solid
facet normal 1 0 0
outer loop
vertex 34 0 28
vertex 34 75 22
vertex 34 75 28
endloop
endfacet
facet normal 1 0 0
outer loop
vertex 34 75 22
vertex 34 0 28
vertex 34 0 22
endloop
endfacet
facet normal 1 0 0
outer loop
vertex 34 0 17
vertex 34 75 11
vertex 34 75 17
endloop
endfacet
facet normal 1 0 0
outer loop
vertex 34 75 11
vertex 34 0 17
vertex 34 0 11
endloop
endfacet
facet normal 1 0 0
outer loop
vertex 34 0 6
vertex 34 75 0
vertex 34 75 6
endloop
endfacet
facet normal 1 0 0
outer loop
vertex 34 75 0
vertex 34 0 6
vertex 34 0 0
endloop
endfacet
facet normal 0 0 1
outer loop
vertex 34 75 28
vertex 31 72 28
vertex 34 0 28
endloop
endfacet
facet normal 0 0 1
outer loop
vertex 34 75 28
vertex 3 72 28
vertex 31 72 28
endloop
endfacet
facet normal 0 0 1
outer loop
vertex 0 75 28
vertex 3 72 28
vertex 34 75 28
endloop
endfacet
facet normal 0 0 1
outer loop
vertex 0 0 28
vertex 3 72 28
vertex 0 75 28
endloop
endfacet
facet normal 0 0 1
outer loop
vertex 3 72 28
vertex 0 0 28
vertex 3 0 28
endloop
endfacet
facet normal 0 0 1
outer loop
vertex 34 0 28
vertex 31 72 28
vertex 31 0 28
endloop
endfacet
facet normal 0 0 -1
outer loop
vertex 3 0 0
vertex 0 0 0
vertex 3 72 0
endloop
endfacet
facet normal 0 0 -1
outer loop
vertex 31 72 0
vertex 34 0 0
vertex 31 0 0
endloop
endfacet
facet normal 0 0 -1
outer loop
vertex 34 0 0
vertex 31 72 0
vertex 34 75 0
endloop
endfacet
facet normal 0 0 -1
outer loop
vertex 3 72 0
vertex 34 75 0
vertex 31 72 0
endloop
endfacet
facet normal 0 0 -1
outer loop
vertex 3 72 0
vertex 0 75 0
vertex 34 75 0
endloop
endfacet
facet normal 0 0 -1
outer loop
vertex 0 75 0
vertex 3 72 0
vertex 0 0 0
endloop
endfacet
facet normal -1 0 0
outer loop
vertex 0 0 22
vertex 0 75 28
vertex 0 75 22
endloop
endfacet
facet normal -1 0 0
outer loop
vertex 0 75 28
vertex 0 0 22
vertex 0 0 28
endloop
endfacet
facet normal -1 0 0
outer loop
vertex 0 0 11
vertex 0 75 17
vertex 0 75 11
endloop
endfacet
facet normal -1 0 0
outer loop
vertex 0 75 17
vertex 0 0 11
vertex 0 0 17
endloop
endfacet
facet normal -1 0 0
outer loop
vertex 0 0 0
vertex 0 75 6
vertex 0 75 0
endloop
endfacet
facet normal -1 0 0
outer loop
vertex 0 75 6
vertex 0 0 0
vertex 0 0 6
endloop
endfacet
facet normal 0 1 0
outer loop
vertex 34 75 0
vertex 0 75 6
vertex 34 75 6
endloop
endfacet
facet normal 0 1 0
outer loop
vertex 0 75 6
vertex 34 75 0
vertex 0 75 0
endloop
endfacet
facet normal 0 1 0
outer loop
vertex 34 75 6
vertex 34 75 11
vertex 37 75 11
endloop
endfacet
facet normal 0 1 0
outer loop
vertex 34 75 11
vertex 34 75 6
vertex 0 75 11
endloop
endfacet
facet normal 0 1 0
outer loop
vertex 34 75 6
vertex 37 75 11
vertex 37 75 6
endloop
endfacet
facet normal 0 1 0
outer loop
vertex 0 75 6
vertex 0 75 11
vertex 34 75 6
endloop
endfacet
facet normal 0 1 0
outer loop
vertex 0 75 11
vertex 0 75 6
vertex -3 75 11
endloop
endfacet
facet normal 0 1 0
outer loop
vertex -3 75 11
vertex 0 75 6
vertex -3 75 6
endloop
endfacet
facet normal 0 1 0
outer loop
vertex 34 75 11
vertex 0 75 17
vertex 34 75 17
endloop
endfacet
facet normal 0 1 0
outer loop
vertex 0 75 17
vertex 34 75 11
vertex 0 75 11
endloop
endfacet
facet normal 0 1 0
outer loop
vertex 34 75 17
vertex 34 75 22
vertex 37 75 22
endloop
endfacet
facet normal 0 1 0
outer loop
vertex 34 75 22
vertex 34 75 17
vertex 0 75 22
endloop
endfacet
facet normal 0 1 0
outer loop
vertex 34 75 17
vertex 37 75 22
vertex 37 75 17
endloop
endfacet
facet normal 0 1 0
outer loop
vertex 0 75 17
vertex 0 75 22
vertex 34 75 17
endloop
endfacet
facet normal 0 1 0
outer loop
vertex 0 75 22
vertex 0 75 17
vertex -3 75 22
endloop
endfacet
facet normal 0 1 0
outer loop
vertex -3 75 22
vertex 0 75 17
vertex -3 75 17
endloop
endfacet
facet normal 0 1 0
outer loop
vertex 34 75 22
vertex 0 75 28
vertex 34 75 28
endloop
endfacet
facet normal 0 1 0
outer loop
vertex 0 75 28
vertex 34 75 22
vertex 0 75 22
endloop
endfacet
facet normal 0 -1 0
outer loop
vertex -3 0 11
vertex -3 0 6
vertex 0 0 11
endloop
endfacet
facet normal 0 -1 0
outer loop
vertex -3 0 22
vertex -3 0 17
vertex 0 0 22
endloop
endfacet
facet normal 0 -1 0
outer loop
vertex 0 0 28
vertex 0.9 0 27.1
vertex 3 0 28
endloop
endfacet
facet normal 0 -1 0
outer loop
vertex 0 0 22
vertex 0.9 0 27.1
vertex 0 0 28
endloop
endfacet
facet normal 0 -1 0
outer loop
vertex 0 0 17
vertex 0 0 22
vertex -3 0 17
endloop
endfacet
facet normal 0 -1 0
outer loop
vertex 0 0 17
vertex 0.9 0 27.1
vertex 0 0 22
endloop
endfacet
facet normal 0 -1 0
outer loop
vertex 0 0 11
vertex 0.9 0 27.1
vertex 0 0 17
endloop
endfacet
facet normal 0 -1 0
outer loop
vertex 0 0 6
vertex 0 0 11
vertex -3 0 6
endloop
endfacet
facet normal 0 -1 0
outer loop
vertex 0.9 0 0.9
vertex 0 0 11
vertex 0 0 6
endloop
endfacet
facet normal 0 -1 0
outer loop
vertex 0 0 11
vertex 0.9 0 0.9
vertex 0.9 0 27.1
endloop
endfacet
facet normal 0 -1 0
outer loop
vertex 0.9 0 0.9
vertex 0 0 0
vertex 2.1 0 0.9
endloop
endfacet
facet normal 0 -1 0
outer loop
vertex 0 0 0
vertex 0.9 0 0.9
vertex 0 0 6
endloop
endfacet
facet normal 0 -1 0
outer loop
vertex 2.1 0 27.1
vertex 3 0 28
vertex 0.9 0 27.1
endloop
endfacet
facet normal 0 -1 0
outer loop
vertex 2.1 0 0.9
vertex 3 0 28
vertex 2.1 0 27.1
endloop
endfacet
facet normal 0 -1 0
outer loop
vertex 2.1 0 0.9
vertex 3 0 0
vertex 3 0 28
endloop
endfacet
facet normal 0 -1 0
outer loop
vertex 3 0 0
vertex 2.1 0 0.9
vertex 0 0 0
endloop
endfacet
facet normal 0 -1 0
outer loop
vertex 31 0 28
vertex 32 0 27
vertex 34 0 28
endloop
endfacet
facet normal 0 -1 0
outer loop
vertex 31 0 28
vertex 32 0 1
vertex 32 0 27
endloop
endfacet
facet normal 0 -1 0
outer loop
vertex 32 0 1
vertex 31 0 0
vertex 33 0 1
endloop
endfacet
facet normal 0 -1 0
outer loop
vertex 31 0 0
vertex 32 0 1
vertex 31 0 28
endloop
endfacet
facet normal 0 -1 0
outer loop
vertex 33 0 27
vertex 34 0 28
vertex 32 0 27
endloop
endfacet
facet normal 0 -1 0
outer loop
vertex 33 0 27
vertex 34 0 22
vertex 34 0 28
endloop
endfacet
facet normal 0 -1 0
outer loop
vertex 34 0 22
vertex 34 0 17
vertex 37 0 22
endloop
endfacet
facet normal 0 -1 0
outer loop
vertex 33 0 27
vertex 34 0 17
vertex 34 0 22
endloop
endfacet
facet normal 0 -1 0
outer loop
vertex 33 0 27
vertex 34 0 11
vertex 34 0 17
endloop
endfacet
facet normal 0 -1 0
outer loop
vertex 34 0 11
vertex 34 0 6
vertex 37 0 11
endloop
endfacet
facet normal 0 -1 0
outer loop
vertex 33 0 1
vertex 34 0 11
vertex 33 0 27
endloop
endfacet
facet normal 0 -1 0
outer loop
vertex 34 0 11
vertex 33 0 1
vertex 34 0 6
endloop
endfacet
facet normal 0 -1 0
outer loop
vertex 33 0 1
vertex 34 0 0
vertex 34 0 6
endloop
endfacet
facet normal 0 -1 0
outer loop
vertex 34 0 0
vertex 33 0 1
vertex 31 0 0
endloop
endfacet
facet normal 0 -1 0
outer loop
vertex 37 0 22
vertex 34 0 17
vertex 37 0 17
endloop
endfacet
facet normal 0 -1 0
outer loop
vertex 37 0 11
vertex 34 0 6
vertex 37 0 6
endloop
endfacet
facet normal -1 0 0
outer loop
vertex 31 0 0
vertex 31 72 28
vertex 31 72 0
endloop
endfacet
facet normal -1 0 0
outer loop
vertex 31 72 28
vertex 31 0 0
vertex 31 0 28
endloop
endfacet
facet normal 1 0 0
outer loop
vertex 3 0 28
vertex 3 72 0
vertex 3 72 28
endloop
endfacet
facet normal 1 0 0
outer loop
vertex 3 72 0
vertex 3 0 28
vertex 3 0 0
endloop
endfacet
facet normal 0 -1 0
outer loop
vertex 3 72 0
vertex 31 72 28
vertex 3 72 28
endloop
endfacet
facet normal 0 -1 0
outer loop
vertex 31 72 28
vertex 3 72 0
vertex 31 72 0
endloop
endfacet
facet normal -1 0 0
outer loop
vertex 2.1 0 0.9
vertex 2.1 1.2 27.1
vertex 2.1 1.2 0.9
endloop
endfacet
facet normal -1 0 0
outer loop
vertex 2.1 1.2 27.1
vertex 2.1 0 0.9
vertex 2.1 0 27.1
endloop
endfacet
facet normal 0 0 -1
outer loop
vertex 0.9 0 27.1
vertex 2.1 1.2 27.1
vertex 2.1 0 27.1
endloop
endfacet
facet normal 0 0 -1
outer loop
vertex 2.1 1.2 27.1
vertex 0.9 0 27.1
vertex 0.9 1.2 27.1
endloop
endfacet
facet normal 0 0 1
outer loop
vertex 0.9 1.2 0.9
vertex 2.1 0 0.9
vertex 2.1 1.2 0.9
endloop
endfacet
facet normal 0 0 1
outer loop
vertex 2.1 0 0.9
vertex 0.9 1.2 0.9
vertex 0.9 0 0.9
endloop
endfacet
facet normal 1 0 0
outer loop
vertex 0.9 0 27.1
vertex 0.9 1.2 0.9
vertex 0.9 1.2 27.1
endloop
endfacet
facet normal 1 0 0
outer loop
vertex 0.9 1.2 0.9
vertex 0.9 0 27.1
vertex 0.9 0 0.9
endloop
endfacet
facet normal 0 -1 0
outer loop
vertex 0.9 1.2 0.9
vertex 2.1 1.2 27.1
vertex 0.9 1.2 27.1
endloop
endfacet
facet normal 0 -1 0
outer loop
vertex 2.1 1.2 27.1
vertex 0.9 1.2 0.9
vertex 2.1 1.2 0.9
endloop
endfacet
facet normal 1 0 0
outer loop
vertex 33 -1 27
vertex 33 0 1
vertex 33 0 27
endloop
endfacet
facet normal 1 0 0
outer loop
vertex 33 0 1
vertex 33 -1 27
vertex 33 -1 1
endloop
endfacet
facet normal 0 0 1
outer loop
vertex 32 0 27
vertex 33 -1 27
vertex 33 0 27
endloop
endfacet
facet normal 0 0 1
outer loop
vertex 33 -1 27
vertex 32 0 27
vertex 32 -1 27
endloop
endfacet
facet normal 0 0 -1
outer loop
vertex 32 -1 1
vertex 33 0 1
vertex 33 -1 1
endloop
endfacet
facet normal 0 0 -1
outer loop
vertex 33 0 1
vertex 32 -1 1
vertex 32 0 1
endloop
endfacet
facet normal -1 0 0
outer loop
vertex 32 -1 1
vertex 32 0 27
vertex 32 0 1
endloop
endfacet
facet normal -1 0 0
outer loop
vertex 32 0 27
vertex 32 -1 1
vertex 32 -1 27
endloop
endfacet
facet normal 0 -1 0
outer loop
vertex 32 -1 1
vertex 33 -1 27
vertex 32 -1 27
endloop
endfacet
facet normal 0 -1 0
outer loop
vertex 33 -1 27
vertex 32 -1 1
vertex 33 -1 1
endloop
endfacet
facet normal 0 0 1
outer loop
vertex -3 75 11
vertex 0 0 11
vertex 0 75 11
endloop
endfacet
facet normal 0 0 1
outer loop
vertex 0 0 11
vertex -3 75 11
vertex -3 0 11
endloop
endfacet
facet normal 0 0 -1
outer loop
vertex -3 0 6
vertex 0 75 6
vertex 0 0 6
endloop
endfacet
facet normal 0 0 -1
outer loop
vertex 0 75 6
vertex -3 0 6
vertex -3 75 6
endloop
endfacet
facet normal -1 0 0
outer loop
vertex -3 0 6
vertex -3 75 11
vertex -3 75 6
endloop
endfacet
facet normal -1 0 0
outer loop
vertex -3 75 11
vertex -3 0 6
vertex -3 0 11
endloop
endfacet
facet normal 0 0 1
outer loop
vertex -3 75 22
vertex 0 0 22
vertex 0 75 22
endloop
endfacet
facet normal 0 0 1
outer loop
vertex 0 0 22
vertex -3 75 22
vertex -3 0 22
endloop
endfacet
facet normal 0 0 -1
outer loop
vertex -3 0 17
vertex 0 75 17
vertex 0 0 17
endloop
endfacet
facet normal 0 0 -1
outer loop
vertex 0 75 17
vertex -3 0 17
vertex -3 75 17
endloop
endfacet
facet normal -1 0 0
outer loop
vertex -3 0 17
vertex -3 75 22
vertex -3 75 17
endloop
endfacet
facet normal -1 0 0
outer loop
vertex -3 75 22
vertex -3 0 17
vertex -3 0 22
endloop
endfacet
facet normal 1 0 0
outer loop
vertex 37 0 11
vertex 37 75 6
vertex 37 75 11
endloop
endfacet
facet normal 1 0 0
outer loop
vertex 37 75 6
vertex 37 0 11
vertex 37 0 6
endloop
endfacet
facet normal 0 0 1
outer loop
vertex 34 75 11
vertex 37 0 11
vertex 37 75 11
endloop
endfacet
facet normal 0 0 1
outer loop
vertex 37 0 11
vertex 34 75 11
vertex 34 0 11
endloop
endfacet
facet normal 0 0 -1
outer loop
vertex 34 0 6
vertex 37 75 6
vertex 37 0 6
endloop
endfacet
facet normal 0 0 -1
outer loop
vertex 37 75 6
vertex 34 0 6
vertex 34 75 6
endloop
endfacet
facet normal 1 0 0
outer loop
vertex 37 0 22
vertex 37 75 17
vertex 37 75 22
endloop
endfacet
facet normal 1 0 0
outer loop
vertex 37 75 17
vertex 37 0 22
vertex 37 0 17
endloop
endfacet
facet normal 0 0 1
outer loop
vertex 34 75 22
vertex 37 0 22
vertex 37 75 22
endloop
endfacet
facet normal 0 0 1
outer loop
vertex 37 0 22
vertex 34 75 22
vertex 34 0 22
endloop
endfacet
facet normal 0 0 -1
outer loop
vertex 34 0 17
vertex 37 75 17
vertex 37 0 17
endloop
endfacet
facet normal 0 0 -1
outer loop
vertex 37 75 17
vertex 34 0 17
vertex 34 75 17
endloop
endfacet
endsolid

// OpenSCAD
moldX = 28;
moldZ = 28;
moldY = 72;
wallThickness = 3;
ribThickness = 3;
ribWidth = 5;

module bounds() {
    cube([moldX+2*wallThickness, moldY + wallThickness, moldZ]);
}

module mold() {
    cube([moldX, moldY, moldZ]);
}

module rib() {
    cube([ribThickness, moldY + wallThickness, ribWidth]);
}


difference() {
    bounds();
    translate([wallThickness,0,0])
    mold();
    translate([0.9,0,0.9])
    cube([1.2,1.2, moldZ - 2 + 0.2]);
}
    translate([wallThickness*2 + moldX -2,-1,1])
    cube([1,1, moldZ - 2]);

    translate([-wallThickness,0,6])
    rib();
    translate([-wallThickness,0,17])
    rib();

    translate([moldX+2*wallThickness,0,6])
    rib();
    translate([moldX+2*wallThickness,0,17])
    rib();
